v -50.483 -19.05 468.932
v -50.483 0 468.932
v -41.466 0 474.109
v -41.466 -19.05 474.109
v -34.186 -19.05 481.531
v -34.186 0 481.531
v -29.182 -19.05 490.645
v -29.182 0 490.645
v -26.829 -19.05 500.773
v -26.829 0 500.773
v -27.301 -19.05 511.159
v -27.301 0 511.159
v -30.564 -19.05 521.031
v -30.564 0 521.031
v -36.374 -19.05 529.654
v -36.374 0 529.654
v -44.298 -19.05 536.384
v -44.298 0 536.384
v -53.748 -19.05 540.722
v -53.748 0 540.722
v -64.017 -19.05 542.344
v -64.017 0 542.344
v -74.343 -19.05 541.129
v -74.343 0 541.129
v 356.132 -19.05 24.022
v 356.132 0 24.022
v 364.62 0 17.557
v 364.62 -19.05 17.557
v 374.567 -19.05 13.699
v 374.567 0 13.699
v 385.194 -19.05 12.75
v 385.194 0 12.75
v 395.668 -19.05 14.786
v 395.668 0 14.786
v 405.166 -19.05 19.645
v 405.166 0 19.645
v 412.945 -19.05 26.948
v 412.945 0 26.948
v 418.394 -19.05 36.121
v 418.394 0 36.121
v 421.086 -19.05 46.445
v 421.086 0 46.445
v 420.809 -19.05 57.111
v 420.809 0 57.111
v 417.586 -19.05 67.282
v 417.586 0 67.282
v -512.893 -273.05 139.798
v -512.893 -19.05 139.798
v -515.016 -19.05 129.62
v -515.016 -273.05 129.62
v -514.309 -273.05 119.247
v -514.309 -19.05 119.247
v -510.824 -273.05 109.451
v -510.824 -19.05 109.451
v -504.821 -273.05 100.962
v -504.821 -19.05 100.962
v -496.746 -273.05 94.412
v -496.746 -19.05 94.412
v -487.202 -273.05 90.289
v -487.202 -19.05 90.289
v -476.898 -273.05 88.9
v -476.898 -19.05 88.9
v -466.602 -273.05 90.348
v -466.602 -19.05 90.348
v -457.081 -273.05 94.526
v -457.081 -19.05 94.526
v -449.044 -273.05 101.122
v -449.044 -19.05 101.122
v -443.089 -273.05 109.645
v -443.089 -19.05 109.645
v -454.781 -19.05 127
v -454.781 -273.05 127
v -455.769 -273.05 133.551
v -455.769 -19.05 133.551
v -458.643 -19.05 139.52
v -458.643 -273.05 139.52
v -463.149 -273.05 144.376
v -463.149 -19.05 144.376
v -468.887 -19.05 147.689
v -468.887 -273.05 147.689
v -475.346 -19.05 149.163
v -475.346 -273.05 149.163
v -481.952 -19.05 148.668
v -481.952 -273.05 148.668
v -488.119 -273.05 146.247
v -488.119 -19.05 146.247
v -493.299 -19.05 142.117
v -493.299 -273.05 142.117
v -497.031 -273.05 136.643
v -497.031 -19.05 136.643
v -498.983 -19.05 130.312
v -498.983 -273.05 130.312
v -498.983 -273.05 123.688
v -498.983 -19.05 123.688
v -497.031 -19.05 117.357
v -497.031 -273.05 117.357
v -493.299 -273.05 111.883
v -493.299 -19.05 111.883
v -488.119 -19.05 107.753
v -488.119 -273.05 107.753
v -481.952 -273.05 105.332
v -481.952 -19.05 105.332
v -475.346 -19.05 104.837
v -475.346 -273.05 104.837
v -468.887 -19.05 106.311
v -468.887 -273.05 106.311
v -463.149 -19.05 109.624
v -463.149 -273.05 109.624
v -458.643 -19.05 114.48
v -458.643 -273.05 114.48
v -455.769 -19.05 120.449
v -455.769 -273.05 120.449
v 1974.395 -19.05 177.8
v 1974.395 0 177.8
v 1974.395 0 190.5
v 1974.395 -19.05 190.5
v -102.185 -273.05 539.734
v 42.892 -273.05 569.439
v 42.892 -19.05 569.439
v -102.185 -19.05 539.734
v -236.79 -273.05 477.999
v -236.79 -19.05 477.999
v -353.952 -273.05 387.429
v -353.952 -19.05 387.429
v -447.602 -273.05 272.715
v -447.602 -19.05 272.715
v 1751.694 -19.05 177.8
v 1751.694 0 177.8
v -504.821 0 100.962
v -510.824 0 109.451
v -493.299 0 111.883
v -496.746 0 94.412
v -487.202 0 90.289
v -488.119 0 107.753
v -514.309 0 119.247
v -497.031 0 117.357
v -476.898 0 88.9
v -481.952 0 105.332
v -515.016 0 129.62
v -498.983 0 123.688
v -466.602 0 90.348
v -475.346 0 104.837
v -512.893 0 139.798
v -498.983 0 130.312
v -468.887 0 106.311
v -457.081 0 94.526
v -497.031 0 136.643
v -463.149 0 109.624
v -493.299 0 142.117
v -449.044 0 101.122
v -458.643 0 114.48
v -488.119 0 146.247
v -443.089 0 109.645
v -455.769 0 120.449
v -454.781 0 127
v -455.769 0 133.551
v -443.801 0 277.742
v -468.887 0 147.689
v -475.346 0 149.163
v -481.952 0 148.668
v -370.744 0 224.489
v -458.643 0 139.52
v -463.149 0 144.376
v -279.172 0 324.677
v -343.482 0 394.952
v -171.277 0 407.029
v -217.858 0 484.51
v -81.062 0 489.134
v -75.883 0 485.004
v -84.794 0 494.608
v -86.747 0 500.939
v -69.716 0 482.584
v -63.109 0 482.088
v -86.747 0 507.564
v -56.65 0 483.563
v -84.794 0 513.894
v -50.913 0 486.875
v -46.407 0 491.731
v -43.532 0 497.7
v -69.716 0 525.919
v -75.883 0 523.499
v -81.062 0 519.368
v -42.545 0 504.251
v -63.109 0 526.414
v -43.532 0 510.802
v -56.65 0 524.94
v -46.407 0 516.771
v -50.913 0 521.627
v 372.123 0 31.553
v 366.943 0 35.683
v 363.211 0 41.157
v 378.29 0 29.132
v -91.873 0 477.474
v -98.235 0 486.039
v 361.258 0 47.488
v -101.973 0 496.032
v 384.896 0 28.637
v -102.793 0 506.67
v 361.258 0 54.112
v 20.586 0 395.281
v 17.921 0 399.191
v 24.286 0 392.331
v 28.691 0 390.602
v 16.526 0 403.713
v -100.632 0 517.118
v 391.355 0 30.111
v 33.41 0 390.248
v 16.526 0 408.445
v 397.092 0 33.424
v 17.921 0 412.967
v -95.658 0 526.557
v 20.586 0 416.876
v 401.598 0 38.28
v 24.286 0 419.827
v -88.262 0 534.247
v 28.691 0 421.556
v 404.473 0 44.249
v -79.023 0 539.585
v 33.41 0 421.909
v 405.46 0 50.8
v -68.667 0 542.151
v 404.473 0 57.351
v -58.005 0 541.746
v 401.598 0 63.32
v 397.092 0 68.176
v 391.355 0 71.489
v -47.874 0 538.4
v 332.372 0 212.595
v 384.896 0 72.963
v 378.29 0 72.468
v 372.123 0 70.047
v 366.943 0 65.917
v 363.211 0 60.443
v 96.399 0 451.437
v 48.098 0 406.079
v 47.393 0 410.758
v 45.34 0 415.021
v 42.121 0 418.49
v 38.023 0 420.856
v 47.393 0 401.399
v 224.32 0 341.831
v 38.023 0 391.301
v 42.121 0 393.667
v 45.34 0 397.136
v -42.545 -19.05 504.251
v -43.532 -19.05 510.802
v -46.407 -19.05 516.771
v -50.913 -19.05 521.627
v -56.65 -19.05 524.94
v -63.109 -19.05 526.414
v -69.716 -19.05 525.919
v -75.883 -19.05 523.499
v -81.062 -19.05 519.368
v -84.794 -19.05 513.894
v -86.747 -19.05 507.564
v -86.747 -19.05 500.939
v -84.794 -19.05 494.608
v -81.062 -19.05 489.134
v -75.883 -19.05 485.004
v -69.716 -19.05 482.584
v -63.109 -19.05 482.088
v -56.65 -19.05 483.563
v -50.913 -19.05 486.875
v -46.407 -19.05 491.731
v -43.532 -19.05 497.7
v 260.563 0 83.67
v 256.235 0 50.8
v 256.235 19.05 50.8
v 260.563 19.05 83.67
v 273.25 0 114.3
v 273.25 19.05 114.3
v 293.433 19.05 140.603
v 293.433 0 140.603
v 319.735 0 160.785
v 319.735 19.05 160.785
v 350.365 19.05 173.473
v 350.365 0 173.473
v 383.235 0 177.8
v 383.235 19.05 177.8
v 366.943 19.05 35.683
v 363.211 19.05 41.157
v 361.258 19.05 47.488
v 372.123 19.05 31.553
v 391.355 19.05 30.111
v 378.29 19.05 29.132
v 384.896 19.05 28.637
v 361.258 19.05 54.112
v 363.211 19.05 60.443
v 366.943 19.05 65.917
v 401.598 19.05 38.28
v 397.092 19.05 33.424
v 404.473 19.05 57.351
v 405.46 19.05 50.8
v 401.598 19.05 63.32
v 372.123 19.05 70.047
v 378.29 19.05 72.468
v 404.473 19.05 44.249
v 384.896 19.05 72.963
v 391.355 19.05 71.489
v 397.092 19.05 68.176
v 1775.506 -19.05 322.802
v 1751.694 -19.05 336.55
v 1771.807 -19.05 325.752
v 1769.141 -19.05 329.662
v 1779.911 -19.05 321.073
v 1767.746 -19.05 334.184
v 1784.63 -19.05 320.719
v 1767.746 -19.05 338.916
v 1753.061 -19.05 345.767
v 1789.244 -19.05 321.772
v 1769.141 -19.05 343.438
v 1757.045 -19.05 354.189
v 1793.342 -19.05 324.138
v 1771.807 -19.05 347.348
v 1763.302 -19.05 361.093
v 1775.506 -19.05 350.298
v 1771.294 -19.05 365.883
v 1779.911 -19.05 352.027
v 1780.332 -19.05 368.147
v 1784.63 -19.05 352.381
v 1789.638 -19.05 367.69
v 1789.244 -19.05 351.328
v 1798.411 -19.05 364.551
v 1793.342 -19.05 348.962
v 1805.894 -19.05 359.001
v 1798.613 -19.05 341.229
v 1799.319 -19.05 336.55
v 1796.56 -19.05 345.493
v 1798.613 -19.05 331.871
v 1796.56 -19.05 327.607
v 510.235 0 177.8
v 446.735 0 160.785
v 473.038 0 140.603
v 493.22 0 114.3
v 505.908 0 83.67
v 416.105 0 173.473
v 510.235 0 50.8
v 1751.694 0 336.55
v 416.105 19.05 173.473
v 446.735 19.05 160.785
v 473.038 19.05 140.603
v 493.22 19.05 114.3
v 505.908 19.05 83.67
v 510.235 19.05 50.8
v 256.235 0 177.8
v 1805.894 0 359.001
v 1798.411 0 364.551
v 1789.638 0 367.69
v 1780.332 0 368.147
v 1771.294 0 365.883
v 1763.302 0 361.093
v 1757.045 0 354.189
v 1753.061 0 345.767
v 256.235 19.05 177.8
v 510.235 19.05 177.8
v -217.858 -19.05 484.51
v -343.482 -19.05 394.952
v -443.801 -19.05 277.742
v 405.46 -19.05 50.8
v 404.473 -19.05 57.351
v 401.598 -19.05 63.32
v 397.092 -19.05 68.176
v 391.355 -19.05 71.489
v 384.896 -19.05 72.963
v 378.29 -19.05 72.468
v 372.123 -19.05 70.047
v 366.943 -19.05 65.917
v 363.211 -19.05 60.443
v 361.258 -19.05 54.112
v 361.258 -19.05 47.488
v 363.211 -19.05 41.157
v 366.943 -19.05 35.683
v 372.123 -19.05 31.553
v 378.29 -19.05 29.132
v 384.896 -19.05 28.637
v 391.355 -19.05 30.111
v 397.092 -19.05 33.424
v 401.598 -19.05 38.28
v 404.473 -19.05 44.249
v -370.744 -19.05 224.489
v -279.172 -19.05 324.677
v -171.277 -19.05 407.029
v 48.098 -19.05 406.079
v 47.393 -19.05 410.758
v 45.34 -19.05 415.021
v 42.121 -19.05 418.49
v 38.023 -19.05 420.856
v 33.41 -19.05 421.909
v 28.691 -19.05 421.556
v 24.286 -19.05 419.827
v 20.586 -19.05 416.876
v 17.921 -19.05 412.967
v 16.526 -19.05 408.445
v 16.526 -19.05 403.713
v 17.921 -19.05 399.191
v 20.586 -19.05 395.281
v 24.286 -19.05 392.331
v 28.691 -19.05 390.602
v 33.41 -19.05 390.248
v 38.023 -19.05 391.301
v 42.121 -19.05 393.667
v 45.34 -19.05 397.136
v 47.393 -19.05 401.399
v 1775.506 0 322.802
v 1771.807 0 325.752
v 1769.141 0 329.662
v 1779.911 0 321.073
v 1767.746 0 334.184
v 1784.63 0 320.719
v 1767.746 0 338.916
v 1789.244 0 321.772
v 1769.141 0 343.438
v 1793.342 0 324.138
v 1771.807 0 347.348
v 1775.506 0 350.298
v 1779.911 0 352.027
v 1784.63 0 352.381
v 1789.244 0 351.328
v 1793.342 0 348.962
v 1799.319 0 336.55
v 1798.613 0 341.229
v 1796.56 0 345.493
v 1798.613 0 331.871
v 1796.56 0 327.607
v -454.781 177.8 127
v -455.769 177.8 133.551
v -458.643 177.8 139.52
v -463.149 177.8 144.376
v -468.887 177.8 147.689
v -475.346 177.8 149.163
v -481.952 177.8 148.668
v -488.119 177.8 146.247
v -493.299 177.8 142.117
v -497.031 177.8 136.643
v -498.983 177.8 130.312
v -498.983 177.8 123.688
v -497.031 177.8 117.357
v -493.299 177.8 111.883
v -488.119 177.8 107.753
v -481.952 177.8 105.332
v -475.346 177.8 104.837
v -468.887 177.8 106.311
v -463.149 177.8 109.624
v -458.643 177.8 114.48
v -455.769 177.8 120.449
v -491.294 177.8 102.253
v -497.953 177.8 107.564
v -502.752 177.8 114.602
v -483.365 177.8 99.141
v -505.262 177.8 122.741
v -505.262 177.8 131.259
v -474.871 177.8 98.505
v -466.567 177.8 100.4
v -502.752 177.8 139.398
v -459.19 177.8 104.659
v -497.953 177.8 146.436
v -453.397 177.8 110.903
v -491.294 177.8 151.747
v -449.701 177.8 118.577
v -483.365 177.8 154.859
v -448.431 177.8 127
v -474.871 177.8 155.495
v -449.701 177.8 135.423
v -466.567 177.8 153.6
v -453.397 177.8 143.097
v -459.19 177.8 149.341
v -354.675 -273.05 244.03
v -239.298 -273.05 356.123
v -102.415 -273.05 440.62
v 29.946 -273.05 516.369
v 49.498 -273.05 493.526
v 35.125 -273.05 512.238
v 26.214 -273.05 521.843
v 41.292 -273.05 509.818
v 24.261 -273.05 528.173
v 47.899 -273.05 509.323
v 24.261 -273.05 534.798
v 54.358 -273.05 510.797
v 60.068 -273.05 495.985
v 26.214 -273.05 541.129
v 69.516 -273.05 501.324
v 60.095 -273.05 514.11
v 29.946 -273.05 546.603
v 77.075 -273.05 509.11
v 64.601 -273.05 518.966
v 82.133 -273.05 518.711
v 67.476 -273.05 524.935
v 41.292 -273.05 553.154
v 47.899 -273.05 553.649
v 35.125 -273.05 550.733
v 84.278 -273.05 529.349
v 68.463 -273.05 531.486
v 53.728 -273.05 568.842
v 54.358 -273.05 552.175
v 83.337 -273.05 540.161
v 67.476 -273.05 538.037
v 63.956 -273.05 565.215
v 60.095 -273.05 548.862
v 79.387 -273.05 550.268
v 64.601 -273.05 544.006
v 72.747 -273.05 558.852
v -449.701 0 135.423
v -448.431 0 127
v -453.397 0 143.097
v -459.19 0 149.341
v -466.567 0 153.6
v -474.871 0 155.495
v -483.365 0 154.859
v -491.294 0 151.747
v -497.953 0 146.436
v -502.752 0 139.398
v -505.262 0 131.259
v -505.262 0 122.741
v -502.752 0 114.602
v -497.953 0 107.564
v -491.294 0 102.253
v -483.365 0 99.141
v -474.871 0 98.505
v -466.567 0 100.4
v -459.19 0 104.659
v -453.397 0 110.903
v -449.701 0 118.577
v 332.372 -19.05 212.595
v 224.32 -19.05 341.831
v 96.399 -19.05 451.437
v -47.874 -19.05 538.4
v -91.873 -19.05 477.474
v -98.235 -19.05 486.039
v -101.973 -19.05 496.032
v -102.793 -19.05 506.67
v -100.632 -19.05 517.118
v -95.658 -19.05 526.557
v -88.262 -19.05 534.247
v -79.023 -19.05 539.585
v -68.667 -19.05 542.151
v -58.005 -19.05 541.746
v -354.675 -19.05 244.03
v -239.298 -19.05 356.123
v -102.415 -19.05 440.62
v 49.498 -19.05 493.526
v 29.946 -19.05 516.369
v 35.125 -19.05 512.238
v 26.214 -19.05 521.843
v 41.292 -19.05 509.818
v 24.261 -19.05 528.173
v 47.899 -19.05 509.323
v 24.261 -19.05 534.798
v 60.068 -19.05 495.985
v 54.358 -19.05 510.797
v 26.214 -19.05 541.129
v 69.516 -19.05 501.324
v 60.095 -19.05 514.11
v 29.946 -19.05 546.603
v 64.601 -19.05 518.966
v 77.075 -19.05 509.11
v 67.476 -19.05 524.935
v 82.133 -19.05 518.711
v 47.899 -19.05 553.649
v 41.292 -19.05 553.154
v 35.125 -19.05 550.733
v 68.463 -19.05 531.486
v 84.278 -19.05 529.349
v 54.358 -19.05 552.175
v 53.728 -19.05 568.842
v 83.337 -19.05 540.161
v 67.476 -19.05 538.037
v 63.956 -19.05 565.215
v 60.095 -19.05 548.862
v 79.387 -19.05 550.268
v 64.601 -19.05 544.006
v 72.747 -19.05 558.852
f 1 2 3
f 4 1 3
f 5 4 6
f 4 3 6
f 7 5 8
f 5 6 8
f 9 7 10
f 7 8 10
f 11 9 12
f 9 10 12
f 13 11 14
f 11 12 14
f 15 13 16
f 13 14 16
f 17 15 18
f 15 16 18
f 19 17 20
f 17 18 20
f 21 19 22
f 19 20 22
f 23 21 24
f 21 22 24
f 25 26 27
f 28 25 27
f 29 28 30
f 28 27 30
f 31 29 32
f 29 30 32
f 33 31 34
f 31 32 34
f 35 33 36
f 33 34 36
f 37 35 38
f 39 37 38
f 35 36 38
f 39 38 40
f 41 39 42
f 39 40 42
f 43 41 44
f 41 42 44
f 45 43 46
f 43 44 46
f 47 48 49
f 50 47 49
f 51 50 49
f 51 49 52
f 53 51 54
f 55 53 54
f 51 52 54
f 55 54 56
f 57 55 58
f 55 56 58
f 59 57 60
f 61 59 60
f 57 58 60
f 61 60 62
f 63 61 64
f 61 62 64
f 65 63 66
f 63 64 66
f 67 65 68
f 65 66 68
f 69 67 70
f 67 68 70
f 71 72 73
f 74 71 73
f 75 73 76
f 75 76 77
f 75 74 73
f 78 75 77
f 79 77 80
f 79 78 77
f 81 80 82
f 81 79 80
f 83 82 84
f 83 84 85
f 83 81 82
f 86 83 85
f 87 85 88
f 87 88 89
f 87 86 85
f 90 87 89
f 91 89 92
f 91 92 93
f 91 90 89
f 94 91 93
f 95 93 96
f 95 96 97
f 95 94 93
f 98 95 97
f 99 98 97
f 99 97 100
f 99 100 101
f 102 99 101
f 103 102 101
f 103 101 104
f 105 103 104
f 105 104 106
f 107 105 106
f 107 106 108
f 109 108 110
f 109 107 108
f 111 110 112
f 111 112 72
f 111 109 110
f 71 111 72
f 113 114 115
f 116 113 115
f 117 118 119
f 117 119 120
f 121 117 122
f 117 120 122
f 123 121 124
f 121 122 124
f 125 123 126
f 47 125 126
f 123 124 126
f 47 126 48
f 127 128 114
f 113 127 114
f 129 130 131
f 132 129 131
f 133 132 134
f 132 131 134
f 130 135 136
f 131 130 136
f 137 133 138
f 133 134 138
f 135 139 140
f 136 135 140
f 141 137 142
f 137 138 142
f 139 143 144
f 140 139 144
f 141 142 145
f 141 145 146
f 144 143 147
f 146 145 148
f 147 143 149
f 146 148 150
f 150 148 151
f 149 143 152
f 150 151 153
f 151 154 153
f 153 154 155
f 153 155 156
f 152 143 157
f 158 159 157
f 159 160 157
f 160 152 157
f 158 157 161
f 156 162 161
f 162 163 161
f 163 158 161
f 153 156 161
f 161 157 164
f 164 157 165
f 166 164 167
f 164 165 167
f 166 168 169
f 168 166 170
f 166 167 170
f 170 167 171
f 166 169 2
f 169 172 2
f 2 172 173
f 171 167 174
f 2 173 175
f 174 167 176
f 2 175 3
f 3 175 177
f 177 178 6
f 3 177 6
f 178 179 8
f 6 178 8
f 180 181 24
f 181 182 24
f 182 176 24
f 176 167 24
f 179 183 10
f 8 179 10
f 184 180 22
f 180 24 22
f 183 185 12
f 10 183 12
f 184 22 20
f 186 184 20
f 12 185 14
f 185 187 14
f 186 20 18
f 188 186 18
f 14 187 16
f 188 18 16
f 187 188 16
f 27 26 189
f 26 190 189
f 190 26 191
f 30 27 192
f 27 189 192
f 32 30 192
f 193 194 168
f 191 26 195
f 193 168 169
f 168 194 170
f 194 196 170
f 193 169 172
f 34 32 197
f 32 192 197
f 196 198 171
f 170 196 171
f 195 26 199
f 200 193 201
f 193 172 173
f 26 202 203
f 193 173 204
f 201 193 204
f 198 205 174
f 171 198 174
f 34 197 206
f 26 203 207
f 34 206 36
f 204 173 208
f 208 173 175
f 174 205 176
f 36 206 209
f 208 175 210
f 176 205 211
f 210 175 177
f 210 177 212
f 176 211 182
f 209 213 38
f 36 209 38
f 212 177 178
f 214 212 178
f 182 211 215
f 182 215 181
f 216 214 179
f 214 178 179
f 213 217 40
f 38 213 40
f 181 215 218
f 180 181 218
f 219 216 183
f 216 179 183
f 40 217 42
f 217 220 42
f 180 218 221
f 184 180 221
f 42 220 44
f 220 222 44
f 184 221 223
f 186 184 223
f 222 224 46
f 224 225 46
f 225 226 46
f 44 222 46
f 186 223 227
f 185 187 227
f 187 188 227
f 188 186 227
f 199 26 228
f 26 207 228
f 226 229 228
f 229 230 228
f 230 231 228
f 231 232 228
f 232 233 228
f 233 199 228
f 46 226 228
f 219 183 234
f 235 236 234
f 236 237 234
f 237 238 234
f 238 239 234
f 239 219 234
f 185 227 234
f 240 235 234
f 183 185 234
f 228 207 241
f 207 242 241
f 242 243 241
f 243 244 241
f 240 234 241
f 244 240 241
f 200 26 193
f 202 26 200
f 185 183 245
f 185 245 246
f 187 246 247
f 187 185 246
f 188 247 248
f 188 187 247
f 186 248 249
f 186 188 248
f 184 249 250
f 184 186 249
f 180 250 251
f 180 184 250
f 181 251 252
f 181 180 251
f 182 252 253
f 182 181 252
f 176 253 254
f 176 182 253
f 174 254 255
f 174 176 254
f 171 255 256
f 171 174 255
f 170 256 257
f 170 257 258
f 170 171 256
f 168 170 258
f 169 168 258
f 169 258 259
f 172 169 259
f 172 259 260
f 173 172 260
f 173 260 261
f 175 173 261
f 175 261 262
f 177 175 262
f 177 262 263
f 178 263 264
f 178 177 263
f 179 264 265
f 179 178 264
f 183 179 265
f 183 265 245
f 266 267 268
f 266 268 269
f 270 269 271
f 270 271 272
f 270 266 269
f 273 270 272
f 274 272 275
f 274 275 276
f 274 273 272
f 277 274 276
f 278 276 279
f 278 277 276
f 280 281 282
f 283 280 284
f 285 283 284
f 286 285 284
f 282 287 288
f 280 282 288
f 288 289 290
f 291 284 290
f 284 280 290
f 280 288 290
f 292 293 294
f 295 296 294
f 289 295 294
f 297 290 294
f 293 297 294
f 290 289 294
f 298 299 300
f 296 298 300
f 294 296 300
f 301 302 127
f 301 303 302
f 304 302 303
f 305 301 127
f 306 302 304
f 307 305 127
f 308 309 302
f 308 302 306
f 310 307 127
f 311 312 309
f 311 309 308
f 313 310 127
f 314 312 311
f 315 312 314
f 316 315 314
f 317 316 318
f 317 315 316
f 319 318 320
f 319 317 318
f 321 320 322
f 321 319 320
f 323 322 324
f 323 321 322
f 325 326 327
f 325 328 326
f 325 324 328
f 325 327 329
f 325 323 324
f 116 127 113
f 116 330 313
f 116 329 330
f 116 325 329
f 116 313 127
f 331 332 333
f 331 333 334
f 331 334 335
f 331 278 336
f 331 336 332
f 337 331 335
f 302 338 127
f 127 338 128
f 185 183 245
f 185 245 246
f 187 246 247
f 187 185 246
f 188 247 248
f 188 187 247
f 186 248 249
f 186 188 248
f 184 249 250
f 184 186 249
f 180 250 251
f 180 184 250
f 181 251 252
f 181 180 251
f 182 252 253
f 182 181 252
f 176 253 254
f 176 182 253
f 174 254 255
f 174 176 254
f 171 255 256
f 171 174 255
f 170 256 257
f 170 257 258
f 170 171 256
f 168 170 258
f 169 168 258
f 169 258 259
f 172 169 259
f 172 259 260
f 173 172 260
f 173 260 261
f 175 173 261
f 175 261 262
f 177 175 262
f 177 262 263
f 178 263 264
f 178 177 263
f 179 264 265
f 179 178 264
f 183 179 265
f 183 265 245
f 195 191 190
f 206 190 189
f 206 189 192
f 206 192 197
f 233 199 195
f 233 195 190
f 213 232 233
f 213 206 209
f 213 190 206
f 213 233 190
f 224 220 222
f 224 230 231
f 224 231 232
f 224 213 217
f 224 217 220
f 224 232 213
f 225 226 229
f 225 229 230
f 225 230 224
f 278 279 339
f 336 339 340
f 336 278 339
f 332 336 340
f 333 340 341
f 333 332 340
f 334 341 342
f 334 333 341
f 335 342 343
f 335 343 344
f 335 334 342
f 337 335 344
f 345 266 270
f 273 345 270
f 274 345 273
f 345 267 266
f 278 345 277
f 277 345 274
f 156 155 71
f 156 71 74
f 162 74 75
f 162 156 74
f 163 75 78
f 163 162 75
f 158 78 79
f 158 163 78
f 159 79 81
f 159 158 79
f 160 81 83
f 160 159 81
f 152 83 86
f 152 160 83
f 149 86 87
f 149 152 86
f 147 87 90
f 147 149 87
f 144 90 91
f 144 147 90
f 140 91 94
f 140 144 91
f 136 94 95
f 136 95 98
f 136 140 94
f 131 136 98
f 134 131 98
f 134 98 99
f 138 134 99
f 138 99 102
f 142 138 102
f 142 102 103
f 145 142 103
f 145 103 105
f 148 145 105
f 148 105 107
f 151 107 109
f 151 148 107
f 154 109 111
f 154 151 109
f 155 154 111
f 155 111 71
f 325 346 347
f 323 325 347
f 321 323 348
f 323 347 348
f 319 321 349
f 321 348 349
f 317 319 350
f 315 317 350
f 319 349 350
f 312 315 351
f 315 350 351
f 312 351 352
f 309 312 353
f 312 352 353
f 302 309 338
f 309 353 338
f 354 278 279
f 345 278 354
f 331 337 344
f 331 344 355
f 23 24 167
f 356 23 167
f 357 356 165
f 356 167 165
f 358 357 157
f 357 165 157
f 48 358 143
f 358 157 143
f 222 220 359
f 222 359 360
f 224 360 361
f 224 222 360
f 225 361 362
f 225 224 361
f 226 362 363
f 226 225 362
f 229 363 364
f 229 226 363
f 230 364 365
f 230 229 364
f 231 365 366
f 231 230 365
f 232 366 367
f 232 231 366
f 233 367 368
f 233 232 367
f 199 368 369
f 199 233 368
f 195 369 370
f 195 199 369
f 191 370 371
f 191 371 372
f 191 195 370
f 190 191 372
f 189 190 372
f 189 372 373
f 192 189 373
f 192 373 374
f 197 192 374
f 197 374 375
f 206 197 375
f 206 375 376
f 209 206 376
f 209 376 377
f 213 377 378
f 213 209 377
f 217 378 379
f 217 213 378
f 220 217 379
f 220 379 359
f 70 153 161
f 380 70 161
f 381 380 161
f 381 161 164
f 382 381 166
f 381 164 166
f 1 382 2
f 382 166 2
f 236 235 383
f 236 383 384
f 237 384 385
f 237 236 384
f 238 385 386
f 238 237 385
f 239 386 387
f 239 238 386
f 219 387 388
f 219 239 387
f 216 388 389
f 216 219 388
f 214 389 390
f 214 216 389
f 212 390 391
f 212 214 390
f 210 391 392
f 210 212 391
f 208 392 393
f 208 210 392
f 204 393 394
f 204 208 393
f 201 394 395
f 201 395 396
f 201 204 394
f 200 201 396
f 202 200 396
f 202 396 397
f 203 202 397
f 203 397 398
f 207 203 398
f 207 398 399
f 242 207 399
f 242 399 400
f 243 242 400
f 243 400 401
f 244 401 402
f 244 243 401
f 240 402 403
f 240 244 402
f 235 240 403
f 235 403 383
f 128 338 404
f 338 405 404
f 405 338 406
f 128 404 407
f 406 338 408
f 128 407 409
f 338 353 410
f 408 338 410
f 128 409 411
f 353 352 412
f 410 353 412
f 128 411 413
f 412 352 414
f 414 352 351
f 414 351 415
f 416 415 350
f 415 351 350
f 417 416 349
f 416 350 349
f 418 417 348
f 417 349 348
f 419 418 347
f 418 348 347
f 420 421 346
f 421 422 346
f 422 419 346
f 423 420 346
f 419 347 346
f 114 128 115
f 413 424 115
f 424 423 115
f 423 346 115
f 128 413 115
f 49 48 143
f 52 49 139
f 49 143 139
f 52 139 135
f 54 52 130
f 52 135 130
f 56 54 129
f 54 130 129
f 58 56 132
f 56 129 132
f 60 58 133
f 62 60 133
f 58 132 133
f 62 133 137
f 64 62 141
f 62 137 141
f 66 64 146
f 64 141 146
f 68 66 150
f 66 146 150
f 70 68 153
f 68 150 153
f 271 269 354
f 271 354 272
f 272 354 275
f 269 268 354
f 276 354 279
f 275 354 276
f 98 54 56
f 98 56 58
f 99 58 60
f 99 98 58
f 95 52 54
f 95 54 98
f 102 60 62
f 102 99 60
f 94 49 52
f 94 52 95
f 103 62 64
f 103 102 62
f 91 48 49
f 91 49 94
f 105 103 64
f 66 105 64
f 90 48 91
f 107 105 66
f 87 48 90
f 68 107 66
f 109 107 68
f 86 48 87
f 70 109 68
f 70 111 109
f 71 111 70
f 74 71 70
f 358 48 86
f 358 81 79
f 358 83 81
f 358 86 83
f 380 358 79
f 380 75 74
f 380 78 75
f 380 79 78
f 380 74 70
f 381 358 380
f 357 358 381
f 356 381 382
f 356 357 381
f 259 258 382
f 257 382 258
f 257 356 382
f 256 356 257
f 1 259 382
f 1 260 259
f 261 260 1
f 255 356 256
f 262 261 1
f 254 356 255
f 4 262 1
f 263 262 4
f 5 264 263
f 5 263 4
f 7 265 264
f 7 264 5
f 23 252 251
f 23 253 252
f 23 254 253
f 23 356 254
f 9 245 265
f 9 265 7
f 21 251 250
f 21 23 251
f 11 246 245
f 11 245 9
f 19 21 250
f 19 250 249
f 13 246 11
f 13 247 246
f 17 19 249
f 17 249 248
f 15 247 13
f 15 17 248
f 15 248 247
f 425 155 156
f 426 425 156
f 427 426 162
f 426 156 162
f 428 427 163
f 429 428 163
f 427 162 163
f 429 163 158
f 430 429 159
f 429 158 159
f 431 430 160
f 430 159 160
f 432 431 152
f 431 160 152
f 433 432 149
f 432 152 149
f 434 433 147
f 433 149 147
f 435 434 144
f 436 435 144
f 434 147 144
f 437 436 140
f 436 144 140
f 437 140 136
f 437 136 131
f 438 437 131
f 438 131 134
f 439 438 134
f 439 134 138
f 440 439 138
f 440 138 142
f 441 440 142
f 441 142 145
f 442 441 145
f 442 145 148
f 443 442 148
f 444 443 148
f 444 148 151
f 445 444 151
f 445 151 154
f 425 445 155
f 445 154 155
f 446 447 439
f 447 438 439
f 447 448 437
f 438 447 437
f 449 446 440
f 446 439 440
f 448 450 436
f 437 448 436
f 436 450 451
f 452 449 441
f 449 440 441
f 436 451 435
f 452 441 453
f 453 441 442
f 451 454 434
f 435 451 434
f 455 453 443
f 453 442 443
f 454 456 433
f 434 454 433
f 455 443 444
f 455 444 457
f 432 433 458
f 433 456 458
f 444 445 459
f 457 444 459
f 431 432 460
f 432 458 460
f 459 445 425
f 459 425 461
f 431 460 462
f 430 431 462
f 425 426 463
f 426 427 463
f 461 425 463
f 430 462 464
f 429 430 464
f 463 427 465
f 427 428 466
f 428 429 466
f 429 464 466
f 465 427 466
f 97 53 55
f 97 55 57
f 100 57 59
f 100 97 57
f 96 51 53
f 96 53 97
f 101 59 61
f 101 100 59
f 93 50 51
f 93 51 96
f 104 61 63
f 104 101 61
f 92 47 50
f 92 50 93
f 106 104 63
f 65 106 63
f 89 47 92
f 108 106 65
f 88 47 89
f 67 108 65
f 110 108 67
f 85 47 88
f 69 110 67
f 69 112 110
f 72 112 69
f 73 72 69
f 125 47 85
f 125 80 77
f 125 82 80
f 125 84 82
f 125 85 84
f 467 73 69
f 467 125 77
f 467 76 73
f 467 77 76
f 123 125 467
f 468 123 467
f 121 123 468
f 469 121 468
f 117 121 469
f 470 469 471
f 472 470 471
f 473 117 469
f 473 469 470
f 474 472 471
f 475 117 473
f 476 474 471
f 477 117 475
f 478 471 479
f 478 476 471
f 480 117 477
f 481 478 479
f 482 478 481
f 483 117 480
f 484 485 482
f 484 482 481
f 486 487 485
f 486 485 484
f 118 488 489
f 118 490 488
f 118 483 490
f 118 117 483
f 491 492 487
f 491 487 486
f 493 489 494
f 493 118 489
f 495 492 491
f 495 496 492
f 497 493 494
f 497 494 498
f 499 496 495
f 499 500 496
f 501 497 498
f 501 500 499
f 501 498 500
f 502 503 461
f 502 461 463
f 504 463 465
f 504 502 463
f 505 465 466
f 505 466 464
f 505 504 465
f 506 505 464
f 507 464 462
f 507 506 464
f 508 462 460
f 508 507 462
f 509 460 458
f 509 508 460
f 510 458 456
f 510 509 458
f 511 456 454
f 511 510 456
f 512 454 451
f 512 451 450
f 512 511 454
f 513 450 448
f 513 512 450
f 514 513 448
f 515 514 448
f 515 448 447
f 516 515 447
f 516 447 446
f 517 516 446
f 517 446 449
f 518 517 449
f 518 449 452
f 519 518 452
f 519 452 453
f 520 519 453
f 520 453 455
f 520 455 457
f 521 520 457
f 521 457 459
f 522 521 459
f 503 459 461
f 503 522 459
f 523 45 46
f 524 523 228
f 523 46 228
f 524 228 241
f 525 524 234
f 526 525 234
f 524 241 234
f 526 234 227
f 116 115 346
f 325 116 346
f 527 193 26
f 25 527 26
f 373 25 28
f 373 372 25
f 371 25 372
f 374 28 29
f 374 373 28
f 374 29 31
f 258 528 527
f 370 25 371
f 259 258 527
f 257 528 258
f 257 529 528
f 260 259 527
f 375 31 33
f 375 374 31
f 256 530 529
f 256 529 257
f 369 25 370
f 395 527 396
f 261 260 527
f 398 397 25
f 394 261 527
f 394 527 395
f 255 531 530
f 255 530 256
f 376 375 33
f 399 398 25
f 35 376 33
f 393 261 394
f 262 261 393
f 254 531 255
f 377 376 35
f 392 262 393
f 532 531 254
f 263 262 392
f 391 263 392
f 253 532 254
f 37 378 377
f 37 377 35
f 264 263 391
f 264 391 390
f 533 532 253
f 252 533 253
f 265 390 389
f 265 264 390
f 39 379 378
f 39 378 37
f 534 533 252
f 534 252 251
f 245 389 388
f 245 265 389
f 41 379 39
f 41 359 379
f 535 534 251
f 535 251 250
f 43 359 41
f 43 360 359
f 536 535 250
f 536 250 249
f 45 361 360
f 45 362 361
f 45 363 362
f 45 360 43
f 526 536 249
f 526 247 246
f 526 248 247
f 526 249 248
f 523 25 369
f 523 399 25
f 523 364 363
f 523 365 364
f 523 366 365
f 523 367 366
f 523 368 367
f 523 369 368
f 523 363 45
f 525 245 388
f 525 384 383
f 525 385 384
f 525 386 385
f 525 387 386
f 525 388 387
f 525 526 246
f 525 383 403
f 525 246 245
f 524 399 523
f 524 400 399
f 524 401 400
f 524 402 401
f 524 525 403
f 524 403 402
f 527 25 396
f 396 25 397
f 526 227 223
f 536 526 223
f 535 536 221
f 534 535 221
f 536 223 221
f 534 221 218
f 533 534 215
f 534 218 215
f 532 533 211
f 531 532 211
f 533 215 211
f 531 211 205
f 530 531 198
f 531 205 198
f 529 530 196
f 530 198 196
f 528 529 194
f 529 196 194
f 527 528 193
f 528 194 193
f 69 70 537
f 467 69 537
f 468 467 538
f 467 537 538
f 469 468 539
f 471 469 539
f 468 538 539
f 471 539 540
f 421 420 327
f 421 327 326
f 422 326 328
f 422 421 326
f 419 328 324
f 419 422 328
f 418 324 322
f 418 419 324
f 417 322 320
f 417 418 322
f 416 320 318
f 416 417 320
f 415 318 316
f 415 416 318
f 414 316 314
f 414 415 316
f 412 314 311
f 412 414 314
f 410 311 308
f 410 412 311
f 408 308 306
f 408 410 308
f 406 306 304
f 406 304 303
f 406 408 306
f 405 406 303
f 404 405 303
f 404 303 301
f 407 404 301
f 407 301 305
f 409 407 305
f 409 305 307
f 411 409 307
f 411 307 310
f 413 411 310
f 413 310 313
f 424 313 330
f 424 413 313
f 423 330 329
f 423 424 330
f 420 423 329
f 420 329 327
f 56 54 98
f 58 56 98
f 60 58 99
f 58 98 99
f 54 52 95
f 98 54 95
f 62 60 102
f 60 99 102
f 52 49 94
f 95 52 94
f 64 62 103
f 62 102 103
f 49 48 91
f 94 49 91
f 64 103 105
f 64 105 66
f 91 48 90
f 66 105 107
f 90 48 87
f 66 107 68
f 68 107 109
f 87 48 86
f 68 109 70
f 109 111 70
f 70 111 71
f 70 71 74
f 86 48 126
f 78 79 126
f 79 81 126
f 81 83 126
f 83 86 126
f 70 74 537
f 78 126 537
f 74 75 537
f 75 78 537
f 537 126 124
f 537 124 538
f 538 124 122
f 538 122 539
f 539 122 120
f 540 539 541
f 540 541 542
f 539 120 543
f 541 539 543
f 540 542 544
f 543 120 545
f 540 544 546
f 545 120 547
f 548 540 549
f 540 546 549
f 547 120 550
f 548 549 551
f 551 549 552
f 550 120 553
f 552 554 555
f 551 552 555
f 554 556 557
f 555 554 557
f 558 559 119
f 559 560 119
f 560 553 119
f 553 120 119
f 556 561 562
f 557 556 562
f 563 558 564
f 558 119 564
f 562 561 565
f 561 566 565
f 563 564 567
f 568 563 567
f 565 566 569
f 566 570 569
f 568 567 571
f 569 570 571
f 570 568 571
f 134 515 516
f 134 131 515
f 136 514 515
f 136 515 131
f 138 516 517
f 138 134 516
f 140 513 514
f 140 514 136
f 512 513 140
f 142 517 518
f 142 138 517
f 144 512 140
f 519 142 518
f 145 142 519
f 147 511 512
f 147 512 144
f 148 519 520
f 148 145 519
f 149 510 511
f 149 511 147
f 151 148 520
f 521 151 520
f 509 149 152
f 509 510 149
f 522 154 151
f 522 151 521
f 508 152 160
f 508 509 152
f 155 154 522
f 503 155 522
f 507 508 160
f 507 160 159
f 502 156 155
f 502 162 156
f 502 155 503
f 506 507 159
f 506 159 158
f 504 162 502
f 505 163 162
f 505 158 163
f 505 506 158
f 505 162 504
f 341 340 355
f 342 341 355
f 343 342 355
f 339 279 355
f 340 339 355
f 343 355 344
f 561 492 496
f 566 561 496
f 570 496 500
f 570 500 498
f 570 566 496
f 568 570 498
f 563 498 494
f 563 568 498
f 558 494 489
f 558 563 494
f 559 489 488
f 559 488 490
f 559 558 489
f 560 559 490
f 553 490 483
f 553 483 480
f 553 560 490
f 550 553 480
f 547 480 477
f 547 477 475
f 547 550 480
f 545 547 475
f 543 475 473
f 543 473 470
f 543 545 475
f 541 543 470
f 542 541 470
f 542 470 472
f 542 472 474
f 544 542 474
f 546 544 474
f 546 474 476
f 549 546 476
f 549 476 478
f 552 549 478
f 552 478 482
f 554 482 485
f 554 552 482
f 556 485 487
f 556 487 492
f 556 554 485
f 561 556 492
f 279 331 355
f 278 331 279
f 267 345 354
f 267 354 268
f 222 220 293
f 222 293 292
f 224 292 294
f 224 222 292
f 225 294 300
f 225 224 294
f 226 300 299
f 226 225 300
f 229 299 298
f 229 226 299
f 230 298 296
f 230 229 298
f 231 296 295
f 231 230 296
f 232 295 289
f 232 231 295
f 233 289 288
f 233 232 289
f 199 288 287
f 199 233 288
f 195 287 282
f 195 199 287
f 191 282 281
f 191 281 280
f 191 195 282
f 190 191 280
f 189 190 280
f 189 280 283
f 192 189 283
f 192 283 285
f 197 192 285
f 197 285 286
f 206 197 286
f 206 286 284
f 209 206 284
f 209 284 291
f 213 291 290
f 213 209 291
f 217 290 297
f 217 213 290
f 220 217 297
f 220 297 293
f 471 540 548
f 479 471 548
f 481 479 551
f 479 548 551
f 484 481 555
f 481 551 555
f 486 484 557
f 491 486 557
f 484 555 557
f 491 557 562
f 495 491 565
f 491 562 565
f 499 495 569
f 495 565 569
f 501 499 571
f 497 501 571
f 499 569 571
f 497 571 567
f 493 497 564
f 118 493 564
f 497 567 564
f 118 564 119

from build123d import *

# Parameters (mm, degrees)
F1_R      = 28.575
F1_R_2    = 22.225
F2_DEPTH  = 177.8
F3_R      = 22.225
F4_DEPTH  = 19.05
F5_R      = 22.225
F5_R_2    = 15.875
F6_DEPTH  = 19.05
F7_R      = 22.225
F8_DEPTH  = 19.05
F9_R      = 22.225
F10_DEPTH = 254
F11_R     = 15.875
F12_DEPTH = 19.05


with BuildPart() as f2:
    # F1 (on Front) → F2 (new body)
    with BuildSketch(Plane.XZ):
        with Locations((-477.006482, 127)):
            Circle(F1_R)
        with Locations((-477.006482, 127)):
            Circle(F1_R_2, mode=Mode.SUBTRACT)
    extrude(amount=-F2_DEPTH)


with BuildPart() as f4:
    # F3 (on Front) → F4 (new body)
    with BuildSketch(Plane.XZ):
        with Locations((383.2352, 50.8)):
            Circle(F3_R)
        with BuildLine():
            Line((256.2352, 177.8), (256.2352, 50.8))
            ThreePointArc((256.2352, 50.8), (293.432639, 140.602561), (383.2352, 177.8))
            Line((383.2352, 177.8), (256.2352, 177.8))
        make_face()
        with BuildLine():
            Line((510.2352, 177.8), (383.2352, 177.8))
            ThreePointArc((383.2352, 177.8), (473.037761, 140.602561), (510.2352, 50.8))
            Line((510.2352, 50.8), (510.2352, 177.8))
        make_face()
    extrude(amount=-F4_DEPTH)


with BuildPart() as f6:
    # F5 (on Front) → F6 (new body)
    with BuildSketch(Plane.XZ):
        with BuildLine():
            Line((-91.873034, 477.473753), (356.132166, 24.022481))
            ThreePointArc((356.132166, 24.022481), (405.166367, 19.645001), (417.585695, 67.281914))
            ThreePointArc((417.585695, 67.281914), (224.32007, 341.831389), (-47.874253, 538.400119))
            ThreePointArc((-47.874253, 538.400119), (-95.657743, 526.557265), (-91.873034, 477.473753))
        make_face()
        with Locations((383.2352, 50.8)):
            Circle(F5_R, mode=Mode.SUBTRACT)
        with Locations((32.223456, 406.078738)):
            Circle(F5_R_2, mode=Mode.SUBTRACT)
        with Locations((-64.77, 504.251273)):
            Circle(F5_R, mode=Mode.SUBTRACT)
    extrude(amount=F6_DEPTH)


with BuildPart() as f8:
    # F7 (on Front) → F8 (new body)
    with BuildSketch(Plane.XZ):
        with BuildLine():
            ThreePointArc((-74.343336, 541.128925), (-343.482366, 394.951934), (-512.892785, 139.797784))
            ThreePointArc((-512.892785, 139.797784), (-492.115179, 92.023761), (-443.088936, 109.644595))
            ThreePointArc((-443.088936, 109.644595), (-279.171577, 324.677145), (-50.482763, 468.931521))
            ThreePointArc((-50.482763, 468.931521), (-28.594435, 516.206962), (-74.343336, 541.128925))
        make_face()
        with Locations((-477.006482, 127)):
            Circle(F7_R, mode=Mode.SUBTRACT)
        with Locations((-64.77, 504.251273)):
            Circle(F7_R, mode=Mode.SUBTRACT)
    extrude(amount=F8_DEPTH)


with BuildPart() as f10:
    # F9 (on face) → F10 (new body)
    with BuildSketch(Plane.XZ.offset(19.05)):
        with BuildLine():
            ThreePointArc((42.892315, 569.438664), (-297.955481, 436.057373), (-512.892785, 139.797784))
            ThreePointArc((-512.892785, 139.797784), (-492.115179, 92.023761), (-443.088936, 109.644595))
            ThreePointArc((-443.088936, 109.644595), (-239.297716, 356.12295), (49.497992, 493.525571))
            ThreePointArc((49.497992, 493.525571), (84.194535, 534.788683), (42.892315, 569.438664))
        make_face()
        with Locations((-477.006482, 127)):
            Circle(F9_R, mode=Mode.SUBTRACT)
        with Locations((46.237965, 531.485843)):
            Circle(F9_R, mode=Mode.SUBTRACT)
    extrude(amount=F10_DEPTH)


with BuildPart() as f12:
    # F11 (on Front) → F12 (new body)
    with BuildSketch(Plane.XZ):
        with BuildLine():
            Line((1974.39503, 190.5), (1805.894389, 359.00064))
            ThreePointArc((1805.894389, 359.00064), (1771.29355, 365.883175), (1751.693749, 336.55))
            Line((1751.693749, 336.55), (1751.693749, 177.8))
            Line((1751.693749, 177.8), (1974.39503, 177.8))
            Line((1974.39503, 177.8), (1974.39503, 190.5))
        make_face()
        with Locations((1783.443749, 336.55)):
            Circle(F11_R, mode=Mode.SUBTRACT)
    extrude(amount=F12_DEPTH)


solid = Compound([f2.part, f4.part, f6.part, f8.part, f10.part, f12.part])
